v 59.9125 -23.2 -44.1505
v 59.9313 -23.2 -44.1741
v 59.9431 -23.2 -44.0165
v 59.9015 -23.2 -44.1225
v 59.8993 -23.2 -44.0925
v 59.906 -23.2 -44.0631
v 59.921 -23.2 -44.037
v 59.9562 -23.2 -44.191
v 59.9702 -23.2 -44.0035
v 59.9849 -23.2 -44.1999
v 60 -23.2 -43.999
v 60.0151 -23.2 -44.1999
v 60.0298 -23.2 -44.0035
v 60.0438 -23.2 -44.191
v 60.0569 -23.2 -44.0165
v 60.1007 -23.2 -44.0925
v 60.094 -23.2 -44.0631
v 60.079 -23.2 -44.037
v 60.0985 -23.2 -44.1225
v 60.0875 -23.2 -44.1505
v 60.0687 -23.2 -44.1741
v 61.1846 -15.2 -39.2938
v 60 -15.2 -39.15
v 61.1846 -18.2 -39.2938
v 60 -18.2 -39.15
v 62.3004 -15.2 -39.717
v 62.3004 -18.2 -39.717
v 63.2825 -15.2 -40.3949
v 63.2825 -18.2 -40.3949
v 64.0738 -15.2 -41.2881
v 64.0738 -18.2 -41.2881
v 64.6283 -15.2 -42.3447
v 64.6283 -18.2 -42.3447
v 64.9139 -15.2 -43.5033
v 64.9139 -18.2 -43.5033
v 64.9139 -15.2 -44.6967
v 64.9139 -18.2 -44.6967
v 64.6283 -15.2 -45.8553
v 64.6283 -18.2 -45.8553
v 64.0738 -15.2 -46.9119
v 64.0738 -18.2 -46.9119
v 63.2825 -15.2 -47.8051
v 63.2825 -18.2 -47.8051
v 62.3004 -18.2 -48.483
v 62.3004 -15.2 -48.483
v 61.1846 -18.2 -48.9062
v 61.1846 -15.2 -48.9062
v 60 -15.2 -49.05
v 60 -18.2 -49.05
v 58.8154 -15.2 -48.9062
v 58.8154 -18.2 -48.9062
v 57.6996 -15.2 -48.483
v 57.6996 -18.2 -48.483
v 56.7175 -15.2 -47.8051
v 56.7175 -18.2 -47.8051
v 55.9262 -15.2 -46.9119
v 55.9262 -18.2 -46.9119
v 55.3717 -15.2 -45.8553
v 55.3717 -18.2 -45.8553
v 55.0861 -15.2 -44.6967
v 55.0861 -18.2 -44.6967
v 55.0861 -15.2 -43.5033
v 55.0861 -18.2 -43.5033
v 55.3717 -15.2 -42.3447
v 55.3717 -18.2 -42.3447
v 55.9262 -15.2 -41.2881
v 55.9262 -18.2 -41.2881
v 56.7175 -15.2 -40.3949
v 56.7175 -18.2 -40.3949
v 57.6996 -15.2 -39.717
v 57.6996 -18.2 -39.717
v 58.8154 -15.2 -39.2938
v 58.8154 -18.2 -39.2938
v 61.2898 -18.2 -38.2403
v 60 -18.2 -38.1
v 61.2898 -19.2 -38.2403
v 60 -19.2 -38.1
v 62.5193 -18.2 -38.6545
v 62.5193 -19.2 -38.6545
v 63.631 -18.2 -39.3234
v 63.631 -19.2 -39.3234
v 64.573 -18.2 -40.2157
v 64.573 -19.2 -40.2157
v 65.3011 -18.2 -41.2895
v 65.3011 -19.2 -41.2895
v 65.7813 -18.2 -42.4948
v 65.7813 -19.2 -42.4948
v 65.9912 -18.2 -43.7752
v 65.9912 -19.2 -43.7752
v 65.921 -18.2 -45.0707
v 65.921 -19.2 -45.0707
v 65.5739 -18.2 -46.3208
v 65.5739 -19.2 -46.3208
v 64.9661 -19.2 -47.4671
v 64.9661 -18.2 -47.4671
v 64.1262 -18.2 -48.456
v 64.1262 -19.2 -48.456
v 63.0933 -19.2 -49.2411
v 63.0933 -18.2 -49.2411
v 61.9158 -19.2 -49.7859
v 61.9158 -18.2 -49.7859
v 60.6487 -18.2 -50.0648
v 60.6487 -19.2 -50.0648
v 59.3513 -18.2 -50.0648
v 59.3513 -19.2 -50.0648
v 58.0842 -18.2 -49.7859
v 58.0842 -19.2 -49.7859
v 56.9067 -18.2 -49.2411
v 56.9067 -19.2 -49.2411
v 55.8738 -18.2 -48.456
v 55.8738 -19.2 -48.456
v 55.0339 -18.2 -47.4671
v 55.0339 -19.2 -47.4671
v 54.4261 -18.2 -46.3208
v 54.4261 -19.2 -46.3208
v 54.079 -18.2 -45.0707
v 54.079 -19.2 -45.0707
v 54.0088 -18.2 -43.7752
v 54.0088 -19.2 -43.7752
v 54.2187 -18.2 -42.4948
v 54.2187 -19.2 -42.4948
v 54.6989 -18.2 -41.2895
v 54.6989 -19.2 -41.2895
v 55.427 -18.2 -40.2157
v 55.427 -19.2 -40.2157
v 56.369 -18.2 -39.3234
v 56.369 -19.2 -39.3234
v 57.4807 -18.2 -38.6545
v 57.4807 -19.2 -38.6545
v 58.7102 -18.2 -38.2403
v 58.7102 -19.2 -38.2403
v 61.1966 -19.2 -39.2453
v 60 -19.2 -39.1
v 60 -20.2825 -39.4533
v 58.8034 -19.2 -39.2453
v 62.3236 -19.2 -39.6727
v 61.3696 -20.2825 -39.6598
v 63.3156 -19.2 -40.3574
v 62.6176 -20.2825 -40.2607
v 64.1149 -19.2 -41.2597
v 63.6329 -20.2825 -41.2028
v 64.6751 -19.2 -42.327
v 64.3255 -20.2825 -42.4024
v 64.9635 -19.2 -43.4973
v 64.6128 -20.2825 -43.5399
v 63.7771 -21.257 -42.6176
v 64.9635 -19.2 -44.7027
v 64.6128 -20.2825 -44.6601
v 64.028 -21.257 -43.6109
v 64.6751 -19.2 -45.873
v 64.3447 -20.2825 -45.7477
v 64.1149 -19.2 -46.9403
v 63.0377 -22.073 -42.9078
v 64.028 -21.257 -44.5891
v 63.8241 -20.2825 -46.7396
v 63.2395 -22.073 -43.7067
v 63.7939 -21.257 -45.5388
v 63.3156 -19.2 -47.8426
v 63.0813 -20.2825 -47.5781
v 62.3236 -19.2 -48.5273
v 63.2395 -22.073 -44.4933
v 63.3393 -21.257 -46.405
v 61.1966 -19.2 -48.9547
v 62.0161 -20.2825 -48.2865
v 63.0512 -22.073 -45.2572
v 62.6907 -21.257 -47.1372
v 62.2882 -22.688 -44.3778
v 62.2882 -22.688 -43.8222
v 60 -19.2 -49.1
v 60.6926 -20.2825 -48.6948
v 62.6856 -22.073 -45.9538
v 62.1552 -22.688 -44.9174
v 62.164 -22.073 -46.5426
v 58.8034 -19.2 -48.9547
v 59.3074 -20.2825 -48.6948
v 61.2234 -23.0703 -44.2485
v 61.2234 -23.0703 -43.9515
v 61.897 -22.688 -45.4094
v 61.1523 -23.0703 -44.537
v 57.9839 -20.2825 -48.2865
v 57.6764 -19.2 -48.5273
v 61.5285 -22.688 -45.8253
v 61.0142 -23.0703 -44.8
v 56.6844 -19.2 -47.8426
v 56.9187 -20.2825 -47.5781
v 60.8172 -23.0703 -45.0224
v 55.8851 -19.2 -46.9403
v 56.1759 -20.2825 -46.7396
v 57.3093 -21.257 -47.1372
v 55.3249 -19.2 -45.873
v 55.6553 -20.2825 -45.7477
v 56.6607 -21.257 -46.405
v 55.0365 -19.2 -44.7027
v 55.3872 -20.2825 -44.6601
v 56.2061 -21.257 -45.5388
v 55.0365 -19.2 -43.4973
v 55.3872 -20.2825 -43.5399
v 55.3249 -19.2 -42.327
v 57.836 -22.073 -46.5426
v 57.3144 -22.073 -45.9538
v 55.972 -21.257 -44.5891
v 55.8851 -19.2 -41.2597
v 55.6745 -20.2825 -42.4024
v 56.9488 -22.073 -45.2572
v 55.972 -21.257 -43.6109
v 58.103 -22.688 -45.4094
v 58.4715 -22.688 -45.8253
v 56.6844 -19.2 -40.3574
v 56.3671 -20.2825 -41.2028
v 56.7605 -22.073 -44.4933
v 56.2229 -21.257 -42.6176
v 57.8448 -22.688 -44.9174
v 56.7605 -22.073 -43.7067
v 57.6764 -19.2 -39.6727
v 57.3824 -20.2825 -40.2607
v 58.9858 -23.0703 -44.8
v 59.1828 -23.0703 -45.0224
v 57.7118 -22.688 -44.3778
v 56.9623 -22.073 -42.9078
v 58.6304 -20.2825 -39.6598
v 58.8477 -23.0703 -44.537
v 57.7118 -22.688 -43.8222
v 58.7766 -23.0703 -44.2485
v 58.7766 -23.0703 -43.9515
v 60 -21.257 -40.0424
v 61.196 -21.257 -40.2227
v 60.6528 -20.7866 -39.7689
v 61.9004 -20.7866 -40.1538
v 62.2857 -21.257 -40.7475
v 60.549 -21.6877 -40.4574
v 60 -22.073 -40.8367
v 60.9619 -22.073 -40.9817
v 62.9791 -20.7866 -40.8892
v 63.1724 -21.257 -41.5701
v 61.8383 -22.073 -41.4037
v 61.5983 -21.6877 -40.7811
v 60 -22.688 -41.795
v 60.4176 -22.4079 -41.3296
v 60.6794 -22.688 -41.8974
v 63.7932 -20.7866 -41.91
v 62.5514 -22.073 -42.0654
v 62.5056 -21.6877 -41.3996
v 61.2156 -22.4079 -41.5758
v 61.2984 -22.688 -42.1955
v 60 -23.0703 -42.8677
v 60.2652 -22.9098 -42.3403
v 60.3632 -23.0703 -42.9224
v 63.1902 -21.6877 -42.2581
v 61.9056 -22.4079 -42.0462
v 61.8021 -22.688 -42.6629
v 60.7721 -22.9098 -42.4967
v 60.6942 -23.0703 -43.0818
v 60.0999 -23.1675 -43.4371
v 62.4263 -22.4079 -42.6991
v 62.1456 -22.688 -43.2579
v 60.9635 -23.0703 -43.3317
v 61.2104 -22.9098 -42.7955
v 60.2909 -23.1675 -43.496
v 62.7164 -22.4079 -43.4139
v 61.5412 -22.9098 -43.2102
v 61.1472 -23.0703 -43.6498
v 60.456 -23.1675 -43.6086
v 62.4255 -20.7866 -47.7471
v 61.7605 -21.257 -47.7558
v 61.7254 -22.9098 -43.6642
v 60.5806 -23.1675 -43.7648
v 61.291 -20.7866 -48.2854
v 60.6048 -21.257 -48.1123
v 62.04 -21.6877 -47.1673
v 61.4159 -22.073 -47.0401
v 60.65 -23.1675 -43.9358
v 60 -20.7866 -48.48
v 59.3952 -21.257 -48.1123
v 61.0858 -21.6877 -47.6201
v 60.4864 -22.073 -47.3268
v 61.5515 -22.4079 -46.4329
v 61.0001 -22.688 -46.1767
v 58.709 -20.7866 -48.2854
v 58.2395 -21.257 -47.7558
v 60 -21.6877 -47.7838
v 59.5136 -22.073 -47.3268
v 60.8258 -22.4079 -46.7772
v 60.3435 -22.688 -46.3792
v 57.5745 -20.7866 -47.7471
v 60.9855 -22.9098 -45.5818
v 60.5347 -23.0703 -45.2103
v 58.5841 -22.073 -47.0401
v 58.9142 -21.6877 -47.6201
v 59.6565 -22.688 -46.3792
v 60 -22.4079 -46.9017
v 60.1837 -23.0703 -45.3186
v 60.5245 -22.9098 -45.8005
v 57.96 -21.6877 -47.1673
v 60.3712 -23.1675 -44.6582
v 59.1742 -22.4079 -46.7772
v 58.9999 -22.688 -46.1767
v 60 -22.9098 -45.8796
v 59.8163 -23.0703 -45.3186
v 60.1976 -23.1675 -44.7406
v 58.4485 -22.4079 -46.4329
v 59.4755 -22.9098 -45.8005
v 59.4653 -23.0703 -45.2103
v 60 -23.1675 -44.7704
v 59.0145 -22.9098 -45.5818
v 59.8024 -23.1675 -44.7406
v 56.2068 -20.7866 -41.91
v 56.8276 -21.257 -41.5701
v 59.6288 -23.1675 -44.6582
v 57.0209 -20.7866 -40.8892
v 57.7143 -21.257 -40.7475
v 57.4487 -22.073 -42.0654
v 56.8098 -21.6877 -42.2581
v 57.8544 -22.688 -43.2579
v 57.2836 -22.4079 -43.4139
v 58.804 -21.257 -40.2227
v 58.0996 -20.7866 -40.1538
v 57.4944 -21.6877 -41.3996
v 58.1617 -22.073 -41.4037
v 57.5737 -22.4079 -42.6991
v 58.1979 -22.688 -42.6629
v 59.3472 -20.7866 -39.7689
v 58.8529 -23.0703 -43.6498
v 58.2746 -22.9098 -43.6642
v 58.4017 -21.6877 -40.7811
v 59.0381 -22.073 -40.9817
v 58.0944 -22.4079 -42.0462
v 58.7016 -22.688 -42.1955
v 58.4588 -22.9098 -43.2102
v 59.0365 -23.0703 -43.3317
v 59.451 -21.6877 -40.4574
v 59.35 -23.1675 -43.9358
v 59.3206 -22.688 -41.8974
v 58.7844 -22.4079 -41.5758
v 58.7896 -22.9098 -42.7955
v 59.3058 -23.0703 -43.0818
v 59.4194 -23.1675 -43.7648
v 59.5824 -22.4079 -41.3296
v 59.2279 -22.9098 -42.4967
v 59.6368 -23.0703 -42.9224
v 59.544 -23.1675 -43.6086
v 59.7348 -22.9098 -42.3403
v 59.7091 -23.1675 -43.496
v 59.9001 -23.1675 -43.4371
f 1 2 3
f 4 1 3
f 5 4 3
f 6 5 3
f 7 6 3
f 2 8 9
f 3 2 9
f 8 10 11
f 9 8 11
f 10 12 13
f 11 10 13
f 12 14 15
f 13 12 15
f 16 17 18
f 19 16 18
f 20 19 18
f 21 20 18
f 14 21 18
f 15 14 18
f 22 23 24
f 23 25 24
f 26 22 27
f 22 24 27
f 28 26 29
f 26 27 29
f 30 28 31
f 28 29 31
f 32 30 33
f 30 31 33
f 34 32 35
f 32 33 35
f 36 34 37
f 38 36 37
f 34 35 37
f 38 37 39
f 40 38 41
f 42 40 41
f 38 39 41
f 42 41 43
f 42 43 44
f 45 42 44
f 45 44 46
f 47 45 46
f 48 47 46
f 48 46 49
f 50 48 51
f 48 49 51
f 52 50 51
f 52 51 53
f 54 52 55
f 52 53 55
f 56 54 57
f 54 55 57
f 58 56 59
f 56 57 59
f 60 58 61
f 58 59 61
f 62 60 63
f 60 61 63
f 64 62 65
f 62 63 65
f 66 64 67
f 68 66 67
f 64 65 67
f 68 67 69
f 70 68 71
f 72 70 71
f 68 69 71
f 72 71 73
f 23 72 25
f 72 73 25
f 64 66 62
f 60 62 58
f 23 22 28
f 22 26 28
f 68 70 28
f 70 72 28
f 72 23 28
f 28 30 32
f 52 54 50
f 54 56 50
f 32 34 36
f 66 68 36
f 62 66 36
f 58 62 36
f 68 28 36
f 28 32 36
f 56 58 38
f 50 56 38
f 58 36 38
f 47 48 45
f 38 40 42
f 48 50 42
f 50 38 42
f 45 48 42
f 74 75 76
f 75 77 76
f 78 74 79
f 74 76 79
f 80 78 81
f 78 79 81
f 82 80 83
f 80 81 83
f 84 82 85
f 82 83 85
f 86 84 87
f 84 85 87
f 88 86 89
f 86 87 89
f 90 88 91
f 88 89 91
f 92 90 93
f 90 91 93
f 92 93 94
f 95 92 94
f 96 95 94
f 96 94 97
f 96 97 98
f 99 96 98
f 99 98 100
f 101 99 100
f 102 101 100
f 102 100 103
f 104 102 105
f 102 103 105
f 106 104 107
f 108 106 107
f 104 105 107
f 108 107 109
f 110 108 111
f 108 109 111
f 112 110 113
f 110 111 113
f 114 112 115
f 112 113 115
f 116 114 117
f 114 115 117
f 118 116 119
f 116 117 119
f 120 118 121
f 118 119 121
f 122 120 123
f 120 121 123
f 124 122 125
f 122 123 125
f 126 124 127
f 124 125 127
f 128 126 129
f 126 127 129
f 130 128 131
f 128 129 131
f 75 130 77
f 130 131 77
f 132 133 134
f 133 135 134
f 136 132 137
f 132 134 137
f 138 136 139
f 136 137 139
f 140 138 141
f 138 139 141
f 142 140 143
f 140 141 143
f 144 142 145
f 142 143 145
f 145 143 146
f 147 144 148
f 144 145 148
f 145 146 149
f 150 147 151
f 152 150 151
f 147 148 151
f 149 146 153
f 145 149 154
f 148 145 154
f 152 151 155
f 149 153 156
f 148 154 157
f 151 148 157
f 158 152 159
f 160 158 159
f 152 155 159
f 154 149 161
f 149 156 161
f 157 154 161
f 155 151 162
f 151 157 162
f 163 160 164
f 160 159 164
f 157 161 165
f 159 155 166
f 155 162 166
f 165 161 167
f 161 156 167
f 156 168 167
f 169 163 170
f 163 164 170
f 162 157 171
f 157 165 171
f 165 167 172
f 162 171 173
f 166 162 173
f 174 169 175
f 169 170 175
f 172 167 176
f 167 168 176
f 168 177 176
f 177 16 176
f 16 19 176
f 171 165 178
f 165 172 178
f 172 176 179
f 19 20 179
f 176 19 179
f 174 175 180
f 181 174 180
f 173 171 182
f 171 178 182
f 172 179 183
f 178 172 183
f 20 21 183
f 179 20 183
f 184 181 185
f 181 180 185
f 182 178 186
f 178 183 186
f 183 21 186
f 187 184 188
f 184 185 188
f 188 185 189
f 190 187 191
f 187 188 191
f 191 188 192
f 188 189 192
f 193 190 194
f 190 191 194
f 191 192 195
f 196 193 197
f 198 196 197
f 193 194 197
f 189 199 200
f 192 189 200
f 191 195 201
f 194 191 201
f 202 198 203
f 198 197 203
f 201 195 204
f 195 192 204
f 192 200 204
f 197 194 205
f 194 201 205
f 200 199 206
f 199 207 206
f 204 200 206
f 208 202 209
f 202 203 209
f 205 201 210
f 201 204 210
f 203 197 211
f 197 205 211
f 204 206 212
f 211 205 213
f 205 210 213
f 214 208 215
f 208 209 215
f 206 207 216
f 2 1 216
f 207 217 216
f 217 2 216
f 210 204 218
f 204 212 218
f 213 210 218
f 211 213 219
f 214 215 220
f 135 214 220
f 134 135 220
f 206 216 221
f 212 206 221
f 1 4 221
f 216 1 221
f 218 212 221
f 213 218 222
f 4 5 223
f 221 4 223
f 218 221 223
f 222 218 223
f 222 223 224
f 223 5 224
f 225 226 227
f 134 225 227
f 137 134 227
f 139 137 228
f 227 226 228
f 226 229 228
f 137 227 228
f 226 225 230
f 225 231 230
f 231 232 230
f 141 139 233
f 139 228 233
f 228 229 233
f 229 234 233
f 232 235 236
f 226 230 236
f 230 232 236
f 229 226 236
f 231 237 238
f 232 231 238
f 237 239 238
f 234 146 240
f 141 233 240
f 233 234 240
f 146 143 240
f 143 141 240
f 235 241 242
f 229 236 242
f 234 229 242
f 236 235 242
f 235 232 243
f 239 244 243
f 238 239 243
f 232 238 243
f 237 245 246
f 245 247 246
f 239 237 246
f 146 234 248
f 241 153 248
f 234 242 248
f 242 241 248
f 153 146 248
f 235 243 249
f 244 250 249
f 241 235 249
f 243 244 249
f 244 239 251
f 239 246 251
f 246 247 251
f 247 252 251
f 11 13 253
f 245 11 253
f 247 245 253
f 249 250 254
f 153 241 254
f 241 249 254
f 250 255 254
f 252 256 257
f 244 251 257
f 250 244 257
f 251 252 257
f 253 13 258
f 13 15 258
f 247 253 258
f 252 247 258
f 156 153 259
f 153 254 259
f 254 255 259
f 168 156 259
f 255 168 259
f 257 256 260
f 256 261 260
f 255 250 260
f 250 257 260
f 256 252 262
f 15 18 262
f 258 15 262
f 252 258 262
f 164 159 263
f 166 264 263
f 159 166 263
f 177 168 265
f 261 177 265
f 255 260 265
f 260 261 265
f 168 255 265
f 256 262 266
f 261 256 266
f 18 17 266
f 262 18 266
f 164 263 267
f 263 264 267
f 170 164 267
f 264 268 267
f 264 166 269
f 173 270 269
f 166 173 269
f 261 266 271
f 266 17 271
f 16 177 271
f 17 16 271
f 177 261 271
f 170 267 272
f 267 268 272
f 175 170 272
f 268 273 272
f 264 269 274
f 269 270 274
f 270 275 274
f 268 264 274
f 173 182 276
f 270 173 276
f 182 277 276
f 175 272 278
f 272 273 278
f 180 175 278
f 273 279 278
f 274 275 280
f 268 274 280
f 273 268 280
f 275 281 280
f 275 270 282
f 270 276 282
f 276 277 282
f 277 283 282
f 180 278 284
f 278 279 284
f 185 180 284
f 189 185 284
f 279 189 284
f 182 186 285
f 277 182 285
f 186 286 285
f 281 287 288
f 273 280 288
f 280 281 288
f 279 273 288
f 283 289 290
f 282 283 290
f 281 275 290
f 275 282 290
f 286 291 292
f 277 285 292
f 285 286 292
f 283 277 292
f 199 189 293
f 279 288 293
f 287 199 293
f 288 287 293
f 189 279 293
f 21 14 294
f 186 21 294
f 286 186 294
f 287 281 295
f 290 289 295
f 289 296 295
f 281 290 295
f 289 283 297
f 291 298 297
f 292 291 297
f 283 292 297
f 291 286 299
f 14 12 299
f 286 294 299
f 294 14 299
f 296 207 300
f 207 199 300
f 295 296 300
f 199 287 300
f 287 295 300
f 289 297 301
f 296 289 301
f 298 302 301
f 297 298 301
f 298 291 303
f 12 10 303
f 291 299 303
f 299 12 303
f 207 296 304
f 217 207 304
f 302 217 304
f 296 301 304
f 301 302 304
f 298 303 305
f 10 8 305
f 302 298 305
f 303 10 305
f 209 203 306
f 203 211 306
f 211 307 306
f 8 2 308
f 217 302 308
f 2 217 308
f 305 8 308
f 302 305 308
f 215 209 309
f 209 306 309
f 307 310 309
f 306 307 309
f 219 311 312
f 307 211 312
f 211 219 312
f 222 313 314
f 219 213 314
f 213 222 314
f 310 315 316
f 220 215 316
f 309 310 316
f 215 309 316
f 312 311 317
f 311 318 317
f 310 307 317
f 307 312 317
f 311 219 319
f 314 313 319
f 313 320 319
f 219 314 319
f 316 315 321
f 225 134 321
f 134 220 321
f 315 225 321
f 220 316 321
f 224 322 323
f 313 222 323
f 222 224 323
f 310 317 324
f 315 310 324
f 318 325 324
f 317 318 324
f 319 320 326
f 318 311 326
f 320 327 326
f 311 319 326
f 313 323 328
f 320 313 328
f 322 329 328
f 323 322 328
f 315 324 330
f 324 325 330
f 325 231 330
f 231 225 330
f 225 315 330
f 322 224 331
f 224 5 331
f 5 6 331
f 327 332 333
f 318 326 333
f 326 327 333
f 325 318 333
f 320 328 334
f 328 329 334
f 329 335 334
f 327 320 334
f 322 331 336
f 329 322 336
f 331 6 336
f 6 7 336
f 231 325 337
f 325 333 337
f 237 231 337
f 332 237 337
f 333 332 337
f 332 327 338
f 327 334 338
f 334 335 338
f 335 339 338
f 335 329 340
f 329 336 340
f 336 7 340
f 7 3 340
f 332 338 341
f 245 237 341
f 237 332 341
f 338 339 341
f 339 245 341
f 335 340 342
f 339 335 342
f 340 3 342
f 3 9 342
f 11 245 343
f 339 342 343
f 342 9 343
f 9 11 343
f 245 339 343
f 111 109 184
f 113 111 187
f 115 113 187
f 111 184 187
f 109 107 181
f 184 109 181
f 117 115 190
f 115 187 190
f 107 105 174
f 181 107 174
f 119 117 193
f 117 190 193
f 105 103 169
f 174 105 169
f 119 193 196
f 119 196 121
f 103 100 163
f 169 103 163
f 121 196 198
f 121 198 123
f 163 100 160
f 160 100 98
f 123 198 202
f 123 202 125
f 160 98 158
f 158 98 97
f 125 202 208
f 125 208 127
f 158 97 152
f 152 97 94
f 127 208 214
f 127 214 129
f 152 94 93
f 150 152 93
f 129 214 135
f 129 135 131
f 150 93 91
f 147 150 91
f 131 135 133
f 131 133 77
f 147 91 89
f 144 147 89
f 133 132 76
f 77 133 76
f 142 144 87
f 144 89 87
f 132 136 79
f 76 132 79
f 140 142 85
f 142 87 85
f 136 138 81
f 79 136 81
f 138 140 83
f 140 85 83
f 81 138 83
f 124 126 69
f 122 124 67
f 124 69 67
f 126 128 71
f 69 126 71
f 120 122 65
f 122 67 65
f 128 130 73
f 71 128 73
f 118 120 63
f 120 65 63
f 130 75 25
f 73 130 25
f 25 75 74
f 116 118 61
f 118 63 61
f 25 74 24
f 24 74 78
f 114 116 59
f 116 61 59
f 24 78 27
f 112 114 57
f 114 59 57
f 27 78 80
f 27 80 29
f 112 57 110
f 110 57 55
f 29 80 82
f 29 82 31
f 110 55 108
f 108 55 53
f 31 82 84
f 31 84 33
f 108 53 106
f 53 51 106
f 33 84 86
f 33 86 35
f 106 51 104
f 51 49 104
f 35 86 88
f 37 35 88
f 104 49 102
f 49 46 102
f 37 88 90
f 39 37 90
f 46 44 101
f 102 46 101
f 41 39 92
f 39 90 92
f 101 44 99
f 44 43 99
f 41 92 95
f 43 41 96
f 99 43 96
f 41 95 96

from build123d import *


with BuildPart() as part:
    # Sketch1 → Revolve1 (revolve)
    with BuildSketch(Plane(origin=(0, 0, -44.1), x_dir=(-1, 0, 0), z_dir=(0, 0, -1)), mode=Mode.PRIVATE) as revolve1_sk:
        with BuildLine():
            Line((-60.101021409, -23.2), (-60.000000894, -23.2))
            Line((-60.000000894, -23.2), (-60.000000894, -15.2))
            Line((-60.000000894, -15.2), (-64.950000894, -15.2))
            Line((-64.950000894, -15.2), (-64.950000894, -18.2))
            Line((-64.950000894, -18.2), (-66.000000894, -18.2))
            Line((-66.000000894, -18.2), (-66.000000894, -19.2))
            Line((-66.000000894, -19.2), (-65.000000894, -19.2))
            ThreePointArc((-65.000000894, -19.2), (-63.263299069, -22.072983346), (-60.101021409, -23.2))
        make_face()
    revolve(revolve1_sk.sketch.rotate(Axis((60.000000894, -23.2, -44.1), (0, 1, 0)), 270), axis=Axis((60.000000894, -23.2, -44.1), (0, 1, 0)))


solid = part.part
